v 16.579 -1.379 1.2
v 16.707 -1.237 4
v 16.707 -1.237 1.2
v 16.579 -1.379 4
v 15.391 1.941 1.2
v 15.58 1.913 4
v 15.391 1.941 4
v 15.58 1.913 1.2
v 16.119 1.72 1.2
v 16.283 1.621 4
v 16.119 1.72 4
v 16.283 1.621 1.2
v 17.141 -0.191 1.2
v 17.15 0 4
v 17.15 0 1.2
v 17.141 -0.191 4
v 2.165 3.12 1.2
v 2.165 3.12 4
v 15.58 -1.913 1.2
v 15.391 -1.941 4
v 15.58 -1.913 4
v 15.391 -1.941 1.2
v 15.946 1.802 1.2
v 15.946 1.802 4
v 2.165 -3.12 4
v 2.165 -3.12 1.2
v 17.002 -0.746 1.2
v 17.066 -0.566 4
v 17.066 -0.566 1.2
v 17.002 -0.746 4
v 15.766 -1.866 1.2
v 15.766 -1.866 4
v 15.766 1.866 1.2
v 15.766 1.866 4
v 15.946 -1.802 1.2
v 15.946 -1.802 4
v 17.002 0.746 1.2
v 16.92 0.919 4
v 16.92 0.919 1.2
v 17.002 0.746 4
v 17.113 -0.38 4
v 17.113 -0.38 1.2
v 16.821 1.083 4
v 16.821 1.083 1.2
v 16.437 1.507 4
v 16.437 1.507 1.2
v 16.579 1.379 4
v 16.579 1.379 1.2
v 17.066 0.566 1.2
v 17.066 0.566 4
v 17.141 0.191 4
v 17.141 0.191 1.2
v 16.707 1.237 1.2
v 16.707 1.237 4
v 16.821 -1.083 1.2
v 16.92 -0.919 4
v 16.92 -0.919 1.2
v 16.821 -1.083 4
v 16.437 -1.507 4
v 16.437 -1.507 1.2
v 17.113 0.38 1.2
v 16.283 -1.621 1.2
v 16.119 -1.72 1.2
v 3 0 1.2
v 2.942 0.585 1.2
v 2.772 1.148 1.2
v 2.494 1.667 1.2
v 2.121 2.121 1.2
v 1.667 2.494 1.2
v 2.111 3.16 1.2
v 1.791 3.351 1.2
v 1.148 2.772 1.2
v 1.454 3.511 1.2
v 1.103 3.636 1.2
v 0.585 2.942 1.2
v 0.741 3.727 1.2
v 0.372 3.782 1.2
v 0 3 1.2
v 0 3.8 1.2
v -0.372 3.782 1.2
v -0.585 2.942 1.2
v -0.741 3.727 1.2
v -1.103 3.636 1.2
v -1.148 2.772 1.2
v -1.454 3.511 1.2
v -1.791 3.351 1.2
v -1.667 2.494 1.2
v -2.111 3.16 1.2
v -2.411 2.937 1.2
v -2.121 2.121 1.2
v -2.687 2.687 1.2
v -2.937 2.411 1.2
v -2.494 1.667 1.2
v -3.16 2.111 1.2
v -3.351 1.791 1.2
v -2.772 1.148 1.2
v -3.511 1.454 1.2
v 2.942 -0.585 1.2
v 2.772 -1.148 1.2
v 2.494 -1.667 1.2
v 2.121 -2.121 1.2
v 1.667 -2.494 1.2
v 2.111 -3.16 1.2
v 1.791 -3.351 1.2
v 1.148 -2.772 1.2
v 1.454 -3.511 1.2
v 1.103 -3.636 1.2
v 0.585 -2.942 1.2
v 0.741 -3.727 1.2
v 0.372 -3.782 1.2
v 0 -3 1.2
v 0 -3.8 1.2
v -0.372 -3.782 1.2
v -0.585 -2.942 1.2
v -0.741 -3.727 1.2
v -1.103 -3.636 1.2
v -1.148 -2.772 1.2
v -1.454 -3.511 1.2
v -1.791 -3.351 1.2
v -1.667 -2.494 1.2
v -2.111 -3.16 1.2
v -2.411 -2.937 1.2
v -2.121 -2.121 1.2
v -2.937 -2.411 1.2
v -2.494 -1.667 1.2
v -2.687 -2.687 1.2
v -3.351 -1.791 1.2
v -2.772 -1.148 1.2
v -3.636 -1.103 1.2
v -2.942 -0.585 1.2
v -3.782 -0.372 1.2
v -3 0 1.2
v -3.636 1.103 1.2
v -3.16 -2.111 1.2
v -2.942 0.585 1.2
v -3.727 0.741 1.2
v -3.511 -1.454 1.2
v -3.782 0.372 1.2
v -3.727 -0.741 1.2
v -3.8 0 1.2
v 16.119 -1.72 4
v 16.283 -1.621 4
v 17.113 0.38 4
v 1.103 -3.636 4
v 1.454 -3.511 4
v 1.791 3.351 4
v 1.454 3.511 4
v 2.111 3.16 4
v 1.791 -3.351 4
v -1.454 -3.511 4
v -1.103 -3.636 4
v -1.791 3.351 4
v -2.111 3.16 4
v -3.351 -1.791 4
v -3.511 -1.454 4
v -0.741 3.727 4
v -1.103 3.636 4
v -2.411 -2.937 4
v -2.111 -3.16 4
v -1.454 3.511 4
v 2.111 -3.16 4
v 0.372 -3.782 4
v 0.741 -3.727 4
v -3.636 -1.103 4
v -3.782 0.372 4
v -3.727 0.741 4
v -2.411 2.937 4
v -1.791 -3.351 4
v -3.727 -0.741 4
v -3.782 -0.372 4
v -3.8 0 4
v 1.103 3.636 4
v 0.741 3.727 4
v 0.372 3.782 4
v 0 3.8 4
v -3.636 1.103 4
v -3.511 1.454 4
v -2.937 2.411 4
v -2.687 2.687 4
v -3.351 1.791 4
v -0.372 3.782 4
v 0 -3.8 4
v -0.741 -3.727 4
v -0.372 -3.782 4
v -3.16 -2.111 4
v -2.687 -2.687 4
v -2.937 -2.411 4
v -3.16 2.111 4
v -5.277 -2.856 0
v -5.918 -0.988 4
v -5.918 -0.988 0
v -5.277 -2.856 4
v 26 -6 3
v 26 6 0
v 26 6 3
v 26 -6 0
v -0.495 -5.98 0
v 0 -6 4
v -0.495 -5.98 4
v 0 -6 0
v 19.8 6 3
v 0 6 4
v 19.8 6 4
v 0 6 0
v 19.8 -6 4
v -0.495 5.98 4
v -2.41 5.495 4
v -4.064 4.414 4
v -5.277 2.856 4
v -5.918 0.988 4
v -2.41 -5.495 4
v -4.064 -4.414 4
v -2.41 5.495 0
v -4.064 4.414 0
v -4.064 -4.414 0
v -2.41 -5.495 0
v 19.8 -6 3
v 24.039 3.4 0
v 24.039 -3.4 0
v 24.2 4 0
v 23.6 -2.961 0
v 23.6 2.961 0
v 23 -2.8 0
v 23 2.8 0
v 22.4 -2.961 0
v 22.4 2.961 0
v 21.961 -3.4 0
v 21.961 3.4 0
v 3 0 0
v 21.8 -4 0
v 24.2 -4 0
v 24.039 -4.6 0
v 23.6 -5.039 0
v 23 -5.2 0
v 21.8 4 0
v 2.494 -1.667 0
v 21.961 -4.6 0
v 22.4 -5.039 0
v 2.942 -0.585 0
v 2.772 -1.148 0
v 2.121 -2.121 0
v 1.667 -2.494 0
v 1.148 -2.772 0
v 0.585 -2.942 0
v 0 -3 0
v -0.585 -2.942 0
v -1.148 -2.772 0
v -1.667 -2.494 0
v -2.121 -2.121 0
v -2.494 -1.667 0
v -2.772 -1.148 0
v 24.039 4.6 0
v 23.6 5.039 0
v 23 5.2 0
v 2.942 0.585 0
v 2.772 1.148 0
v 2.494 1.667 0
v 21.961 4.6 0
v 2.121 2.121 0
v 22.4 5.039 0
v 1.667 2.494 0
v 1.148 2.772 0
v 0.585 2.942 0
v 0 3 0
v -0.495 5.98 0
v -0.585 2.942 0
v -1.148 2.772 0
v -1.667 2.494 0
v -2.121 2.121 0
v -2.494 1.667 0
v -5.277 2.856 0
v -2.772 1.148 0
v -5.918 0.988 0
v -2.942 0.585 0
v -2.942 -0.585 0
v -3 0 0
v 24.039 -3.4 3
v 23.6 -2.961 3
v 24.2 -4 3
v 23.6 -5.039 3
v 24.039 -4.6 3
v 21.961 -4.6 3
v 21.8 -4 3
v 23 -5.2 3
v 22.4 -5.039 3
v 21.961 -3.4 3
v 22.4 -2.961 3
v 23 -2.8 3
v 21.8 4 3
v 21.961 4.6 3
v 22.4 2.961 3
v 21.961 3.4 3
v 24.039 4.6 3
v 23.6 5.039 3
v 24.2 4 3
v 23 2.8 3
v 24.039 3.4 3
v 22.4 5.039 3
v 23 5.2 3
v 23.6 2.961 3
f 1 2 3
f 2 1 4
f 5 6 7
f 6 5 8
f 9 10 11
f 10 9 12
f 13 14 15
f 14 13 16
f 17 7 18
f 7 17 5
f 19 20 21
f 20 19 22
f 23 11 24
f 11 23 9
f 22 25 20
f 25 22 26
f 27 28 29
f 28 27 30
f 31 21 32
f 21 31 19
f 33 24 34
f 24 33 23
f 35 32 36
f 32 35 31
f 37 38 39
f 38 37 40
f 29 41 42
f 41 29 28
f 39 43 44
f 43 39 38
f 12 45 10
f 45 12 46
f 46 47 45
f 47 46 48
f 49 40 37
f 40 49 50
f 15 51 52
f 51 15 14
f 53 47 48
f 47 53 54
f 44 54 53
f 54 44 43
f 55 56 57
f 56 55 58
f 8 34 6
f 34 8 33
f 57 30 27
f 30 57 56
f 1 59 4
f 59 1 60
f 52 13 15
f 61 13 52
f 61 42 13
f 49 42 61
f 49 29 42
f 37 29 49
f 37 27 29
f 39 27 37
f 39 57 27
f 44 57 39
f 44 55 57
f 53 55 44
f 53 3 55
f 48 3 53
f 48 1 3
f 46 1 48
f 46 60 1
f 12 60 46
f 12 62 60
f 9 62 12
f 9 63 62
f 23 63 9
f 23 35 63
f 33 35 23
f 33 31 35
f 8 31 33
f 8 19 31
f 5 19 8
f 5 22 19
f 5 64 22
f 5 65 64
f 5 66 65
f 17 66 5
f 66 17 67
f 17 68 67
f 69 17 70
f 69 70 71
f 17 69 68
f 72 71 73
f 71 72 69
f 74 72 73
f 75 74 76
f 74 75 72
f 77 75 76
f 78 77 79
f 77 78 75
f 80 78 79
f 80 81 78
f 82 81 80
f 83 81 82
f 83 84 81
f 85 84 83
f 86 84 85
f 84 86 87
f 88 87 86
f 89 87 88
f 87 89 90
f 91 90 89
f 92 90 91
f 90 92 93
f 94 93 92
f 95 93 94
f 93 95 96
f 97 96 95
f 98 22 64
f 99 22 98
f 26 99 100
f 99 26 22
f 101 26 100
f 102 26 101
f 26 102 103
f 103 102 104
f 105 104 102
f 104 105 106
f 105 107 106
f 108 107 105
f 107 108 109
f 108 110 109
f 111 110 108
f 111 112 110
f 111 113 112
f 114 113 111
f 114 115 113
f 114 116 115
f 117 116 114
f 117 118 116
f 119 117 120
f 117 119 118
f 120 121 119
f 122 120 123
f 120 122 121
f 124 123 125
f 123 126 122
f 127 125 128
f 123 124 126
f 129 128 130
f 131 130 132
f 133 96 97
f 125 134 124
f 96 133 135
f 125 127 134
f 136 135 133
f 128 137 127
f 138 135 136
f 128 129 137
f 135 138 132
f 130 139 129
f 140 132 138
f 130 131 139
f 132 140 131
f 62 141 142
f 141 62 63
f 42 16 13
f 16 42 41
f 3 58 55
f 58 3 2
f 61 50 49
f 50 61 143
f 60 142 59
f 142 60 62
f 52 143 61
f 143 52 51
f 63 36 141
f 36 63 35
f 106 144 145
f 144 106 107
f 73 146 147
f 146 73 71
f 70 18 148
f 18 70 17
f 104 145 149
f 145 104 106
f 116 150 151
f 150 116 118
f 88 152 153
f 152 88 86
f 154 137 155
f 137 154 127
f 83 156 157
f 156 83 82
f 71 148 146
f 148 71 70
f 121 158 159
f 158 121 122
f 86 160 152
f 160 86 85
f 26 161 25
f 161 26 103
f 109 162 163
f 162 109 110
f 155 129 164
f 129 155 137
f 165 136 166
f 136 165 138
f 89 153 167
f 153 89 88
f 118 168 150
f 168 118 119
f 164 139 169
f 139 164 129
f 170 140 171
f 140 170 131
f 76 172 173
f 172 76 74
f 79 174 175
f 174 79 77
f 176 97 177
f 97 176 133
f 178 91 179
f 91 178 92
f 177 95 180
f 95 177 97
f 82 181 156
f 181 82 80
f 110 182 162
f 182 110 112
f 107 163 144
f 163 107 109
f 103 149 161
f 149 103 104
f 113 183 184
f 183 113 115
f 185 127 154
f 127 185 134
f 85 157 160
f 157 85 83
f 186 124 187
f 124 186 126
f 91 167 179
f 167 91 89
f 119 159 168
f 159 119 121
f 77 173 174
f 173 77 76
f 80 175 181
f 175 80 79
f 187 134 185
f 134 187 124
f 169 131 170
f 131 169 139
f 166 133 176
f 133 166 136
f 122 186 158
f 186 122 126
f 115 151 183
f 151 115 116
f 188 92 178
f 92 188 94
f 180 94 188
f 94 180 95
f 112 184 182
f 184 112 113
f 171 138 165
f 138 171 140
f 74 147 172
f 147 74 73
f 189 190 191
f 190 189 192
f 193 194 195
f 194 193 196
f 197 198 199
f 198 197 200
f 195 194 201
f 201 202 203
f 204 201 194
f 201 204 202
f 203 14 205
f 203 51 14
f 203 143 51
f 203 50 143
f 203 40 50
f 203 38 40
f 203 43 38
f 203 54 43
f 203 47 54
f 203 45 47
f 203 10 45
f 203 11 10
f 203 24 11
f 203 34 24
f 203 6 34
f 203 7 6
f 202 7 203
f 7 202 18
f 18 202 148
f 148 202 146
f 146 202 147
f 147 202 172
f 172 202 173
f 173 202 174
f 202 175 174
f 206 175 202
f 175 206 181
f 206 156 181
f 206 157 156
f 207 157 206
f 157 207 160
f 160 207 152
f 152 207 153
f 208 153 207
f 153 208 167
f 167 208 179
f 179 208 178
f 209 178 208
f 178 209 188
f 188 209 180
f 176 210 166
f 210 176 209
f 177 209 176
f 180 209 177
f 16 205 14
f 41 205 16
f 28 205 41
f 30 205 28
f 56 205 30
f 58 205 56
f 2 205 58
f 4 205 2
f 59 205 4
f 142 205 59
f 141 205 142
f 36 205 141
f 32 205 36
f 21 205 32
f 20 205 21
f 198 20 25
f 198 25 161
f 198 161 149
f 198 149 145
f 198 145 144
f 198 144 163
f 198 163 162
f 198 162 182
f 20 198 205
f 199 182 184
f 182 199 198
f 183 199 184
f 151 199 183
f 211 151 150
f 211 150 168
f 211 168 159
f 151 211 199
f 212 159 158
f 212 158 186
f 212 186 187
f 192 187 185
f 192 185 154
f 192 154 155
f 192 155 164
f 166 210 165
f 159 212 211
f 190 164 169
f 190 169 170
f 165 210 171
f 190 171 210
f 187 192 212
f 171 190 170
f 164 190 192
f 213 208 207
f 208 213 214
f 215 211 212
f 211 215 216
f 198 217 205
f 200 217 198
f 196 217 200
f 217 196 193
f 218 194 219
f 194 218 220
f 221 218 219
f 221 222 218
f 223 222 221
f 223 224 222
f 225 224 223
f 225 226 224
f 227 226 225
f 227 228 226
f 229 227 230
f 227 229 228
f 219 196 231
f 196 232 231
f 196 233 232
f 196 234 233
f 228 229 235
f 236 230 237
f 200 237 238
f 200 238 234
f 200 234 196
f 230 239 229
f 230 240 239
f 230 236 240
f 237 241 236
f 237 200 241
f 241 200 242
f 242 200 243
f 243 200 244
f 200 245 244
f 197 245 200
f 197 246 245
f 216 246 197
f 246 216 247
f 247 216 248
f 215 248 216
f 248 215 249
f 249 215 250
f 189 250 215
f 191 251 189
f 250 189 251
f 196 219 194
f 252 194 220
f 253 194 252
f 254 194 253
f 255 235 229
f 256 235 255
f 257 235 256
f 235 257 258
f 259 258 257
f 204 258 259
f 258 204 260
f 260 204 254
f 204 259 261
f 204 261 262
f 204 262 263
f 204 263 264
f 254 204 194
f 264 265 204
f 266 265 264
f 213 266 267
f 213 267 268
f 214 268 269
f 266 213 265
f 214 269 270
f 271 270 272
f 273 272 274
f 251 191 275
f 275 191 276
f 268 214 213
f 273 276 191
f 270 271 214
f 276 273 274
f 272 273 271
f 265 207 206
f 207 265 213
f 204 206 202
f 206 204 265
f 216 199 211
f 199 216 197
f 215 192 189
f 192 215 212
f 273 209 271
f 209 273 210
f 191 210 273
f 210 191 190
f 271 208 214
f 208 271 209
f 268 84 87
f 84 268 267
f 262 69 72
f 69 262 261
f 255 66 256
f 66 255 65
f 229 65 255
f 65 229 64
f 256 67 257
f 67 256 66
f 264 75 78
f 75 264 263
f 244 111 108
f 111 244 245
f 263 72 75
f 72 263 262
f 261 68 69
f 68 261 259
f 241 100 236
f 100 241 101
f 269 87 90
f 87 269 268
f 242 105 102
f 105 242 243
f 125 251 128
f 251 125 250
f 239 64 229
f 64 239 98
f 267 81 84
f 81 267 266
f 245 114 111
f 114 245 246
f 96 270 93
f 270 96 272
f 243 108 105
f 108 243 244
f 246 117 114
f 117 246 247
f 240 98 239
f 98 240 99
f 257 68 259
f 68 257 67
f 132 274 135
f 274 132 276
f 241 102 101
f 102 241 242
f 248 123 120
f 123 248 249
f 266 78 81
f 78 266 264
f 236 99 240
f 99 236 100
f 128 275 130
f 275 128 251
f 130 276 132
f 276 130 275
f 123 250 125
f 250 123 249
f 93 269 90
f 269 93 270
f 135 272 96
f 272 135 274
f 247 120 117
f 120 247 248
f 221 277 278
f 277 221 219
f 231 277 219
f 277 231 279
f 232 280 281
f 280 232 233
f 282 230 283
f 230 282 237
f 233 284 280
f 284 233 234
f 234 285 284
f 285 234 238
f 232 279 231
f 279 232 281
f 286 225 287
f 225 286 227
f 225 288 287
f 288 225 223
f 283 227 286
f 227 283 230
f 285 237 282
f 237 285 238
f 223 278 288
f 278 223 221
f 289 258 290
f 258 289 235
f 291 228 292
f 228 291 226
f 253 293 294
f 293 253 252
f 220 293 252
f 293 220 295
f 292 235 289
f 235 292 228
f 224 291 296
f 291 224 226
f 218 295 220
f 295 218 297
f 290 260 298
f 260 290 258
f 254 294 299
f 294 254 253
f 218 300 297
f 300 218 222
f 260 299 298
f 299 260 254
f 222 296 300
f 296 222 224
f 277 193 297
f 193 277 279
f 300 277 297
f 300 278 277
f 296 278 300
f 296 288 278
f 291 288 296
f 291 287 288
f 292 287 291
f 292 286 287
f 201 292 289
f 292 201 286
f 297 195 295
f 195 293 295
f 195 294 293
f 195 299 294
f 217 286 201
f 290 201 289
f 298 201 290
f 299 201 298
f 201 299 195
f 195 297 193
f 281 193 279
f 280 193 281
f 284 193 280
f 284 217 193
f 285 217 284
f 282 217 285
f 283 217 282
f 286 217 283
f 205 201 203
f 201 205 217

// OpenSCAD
// file: horn1.scad
$fn = 64;

horn_r     = 7.6/2; //big horn
horn_r2    = 6.6/2;
horn_h     = 4;

center_to_tip_center = 19 - horn_r;

horn_thick = 4;
horn_tip   = 3.9/2;

horn1();

module horn1() {
    hull() {
        cylinder(r=horn_r2, h=horn_thick);
        translate([center_to_tip_center, 0,0])
        cylinder(r=horn_tip, h = horn_thick);
    }
    cylinder(r=horn_r,h=horn_h);
}
// main file
use<horn1.scad>

mount_y = 12;
mount_x = 32-mount_y/2;

thick   = 4;

difference() {
    union() {
        hull() {
            cylinder(r=mount_y/2, h=thick);
            translate([0,-mount_y/2,0])
            cube([mount_x,mount_y,thick]);
        }
		
//    translate([mount_x-3*2, -mount_y/2,thick])
//    cube([6,mount_y,1.5]);
    }
    translate([0,0,1.2])
    horn1();
    translate([0,0,-.1])
    cylinder(r=3,h=5, $fn = 32);
    
    
    translate([mount_x-3,-4,-.1])
    cylinder(r=1.2, h=15, $fn=12);
    translate([mount_x-3,4,-.1])
    cylinder(r=1.2, h=15, $fn=12);
	
	
    translate([mount_x-3.1*2, -mount_y/2-.1,3])
    cube([6+.6,mount_y+.2,8]);
    
}
